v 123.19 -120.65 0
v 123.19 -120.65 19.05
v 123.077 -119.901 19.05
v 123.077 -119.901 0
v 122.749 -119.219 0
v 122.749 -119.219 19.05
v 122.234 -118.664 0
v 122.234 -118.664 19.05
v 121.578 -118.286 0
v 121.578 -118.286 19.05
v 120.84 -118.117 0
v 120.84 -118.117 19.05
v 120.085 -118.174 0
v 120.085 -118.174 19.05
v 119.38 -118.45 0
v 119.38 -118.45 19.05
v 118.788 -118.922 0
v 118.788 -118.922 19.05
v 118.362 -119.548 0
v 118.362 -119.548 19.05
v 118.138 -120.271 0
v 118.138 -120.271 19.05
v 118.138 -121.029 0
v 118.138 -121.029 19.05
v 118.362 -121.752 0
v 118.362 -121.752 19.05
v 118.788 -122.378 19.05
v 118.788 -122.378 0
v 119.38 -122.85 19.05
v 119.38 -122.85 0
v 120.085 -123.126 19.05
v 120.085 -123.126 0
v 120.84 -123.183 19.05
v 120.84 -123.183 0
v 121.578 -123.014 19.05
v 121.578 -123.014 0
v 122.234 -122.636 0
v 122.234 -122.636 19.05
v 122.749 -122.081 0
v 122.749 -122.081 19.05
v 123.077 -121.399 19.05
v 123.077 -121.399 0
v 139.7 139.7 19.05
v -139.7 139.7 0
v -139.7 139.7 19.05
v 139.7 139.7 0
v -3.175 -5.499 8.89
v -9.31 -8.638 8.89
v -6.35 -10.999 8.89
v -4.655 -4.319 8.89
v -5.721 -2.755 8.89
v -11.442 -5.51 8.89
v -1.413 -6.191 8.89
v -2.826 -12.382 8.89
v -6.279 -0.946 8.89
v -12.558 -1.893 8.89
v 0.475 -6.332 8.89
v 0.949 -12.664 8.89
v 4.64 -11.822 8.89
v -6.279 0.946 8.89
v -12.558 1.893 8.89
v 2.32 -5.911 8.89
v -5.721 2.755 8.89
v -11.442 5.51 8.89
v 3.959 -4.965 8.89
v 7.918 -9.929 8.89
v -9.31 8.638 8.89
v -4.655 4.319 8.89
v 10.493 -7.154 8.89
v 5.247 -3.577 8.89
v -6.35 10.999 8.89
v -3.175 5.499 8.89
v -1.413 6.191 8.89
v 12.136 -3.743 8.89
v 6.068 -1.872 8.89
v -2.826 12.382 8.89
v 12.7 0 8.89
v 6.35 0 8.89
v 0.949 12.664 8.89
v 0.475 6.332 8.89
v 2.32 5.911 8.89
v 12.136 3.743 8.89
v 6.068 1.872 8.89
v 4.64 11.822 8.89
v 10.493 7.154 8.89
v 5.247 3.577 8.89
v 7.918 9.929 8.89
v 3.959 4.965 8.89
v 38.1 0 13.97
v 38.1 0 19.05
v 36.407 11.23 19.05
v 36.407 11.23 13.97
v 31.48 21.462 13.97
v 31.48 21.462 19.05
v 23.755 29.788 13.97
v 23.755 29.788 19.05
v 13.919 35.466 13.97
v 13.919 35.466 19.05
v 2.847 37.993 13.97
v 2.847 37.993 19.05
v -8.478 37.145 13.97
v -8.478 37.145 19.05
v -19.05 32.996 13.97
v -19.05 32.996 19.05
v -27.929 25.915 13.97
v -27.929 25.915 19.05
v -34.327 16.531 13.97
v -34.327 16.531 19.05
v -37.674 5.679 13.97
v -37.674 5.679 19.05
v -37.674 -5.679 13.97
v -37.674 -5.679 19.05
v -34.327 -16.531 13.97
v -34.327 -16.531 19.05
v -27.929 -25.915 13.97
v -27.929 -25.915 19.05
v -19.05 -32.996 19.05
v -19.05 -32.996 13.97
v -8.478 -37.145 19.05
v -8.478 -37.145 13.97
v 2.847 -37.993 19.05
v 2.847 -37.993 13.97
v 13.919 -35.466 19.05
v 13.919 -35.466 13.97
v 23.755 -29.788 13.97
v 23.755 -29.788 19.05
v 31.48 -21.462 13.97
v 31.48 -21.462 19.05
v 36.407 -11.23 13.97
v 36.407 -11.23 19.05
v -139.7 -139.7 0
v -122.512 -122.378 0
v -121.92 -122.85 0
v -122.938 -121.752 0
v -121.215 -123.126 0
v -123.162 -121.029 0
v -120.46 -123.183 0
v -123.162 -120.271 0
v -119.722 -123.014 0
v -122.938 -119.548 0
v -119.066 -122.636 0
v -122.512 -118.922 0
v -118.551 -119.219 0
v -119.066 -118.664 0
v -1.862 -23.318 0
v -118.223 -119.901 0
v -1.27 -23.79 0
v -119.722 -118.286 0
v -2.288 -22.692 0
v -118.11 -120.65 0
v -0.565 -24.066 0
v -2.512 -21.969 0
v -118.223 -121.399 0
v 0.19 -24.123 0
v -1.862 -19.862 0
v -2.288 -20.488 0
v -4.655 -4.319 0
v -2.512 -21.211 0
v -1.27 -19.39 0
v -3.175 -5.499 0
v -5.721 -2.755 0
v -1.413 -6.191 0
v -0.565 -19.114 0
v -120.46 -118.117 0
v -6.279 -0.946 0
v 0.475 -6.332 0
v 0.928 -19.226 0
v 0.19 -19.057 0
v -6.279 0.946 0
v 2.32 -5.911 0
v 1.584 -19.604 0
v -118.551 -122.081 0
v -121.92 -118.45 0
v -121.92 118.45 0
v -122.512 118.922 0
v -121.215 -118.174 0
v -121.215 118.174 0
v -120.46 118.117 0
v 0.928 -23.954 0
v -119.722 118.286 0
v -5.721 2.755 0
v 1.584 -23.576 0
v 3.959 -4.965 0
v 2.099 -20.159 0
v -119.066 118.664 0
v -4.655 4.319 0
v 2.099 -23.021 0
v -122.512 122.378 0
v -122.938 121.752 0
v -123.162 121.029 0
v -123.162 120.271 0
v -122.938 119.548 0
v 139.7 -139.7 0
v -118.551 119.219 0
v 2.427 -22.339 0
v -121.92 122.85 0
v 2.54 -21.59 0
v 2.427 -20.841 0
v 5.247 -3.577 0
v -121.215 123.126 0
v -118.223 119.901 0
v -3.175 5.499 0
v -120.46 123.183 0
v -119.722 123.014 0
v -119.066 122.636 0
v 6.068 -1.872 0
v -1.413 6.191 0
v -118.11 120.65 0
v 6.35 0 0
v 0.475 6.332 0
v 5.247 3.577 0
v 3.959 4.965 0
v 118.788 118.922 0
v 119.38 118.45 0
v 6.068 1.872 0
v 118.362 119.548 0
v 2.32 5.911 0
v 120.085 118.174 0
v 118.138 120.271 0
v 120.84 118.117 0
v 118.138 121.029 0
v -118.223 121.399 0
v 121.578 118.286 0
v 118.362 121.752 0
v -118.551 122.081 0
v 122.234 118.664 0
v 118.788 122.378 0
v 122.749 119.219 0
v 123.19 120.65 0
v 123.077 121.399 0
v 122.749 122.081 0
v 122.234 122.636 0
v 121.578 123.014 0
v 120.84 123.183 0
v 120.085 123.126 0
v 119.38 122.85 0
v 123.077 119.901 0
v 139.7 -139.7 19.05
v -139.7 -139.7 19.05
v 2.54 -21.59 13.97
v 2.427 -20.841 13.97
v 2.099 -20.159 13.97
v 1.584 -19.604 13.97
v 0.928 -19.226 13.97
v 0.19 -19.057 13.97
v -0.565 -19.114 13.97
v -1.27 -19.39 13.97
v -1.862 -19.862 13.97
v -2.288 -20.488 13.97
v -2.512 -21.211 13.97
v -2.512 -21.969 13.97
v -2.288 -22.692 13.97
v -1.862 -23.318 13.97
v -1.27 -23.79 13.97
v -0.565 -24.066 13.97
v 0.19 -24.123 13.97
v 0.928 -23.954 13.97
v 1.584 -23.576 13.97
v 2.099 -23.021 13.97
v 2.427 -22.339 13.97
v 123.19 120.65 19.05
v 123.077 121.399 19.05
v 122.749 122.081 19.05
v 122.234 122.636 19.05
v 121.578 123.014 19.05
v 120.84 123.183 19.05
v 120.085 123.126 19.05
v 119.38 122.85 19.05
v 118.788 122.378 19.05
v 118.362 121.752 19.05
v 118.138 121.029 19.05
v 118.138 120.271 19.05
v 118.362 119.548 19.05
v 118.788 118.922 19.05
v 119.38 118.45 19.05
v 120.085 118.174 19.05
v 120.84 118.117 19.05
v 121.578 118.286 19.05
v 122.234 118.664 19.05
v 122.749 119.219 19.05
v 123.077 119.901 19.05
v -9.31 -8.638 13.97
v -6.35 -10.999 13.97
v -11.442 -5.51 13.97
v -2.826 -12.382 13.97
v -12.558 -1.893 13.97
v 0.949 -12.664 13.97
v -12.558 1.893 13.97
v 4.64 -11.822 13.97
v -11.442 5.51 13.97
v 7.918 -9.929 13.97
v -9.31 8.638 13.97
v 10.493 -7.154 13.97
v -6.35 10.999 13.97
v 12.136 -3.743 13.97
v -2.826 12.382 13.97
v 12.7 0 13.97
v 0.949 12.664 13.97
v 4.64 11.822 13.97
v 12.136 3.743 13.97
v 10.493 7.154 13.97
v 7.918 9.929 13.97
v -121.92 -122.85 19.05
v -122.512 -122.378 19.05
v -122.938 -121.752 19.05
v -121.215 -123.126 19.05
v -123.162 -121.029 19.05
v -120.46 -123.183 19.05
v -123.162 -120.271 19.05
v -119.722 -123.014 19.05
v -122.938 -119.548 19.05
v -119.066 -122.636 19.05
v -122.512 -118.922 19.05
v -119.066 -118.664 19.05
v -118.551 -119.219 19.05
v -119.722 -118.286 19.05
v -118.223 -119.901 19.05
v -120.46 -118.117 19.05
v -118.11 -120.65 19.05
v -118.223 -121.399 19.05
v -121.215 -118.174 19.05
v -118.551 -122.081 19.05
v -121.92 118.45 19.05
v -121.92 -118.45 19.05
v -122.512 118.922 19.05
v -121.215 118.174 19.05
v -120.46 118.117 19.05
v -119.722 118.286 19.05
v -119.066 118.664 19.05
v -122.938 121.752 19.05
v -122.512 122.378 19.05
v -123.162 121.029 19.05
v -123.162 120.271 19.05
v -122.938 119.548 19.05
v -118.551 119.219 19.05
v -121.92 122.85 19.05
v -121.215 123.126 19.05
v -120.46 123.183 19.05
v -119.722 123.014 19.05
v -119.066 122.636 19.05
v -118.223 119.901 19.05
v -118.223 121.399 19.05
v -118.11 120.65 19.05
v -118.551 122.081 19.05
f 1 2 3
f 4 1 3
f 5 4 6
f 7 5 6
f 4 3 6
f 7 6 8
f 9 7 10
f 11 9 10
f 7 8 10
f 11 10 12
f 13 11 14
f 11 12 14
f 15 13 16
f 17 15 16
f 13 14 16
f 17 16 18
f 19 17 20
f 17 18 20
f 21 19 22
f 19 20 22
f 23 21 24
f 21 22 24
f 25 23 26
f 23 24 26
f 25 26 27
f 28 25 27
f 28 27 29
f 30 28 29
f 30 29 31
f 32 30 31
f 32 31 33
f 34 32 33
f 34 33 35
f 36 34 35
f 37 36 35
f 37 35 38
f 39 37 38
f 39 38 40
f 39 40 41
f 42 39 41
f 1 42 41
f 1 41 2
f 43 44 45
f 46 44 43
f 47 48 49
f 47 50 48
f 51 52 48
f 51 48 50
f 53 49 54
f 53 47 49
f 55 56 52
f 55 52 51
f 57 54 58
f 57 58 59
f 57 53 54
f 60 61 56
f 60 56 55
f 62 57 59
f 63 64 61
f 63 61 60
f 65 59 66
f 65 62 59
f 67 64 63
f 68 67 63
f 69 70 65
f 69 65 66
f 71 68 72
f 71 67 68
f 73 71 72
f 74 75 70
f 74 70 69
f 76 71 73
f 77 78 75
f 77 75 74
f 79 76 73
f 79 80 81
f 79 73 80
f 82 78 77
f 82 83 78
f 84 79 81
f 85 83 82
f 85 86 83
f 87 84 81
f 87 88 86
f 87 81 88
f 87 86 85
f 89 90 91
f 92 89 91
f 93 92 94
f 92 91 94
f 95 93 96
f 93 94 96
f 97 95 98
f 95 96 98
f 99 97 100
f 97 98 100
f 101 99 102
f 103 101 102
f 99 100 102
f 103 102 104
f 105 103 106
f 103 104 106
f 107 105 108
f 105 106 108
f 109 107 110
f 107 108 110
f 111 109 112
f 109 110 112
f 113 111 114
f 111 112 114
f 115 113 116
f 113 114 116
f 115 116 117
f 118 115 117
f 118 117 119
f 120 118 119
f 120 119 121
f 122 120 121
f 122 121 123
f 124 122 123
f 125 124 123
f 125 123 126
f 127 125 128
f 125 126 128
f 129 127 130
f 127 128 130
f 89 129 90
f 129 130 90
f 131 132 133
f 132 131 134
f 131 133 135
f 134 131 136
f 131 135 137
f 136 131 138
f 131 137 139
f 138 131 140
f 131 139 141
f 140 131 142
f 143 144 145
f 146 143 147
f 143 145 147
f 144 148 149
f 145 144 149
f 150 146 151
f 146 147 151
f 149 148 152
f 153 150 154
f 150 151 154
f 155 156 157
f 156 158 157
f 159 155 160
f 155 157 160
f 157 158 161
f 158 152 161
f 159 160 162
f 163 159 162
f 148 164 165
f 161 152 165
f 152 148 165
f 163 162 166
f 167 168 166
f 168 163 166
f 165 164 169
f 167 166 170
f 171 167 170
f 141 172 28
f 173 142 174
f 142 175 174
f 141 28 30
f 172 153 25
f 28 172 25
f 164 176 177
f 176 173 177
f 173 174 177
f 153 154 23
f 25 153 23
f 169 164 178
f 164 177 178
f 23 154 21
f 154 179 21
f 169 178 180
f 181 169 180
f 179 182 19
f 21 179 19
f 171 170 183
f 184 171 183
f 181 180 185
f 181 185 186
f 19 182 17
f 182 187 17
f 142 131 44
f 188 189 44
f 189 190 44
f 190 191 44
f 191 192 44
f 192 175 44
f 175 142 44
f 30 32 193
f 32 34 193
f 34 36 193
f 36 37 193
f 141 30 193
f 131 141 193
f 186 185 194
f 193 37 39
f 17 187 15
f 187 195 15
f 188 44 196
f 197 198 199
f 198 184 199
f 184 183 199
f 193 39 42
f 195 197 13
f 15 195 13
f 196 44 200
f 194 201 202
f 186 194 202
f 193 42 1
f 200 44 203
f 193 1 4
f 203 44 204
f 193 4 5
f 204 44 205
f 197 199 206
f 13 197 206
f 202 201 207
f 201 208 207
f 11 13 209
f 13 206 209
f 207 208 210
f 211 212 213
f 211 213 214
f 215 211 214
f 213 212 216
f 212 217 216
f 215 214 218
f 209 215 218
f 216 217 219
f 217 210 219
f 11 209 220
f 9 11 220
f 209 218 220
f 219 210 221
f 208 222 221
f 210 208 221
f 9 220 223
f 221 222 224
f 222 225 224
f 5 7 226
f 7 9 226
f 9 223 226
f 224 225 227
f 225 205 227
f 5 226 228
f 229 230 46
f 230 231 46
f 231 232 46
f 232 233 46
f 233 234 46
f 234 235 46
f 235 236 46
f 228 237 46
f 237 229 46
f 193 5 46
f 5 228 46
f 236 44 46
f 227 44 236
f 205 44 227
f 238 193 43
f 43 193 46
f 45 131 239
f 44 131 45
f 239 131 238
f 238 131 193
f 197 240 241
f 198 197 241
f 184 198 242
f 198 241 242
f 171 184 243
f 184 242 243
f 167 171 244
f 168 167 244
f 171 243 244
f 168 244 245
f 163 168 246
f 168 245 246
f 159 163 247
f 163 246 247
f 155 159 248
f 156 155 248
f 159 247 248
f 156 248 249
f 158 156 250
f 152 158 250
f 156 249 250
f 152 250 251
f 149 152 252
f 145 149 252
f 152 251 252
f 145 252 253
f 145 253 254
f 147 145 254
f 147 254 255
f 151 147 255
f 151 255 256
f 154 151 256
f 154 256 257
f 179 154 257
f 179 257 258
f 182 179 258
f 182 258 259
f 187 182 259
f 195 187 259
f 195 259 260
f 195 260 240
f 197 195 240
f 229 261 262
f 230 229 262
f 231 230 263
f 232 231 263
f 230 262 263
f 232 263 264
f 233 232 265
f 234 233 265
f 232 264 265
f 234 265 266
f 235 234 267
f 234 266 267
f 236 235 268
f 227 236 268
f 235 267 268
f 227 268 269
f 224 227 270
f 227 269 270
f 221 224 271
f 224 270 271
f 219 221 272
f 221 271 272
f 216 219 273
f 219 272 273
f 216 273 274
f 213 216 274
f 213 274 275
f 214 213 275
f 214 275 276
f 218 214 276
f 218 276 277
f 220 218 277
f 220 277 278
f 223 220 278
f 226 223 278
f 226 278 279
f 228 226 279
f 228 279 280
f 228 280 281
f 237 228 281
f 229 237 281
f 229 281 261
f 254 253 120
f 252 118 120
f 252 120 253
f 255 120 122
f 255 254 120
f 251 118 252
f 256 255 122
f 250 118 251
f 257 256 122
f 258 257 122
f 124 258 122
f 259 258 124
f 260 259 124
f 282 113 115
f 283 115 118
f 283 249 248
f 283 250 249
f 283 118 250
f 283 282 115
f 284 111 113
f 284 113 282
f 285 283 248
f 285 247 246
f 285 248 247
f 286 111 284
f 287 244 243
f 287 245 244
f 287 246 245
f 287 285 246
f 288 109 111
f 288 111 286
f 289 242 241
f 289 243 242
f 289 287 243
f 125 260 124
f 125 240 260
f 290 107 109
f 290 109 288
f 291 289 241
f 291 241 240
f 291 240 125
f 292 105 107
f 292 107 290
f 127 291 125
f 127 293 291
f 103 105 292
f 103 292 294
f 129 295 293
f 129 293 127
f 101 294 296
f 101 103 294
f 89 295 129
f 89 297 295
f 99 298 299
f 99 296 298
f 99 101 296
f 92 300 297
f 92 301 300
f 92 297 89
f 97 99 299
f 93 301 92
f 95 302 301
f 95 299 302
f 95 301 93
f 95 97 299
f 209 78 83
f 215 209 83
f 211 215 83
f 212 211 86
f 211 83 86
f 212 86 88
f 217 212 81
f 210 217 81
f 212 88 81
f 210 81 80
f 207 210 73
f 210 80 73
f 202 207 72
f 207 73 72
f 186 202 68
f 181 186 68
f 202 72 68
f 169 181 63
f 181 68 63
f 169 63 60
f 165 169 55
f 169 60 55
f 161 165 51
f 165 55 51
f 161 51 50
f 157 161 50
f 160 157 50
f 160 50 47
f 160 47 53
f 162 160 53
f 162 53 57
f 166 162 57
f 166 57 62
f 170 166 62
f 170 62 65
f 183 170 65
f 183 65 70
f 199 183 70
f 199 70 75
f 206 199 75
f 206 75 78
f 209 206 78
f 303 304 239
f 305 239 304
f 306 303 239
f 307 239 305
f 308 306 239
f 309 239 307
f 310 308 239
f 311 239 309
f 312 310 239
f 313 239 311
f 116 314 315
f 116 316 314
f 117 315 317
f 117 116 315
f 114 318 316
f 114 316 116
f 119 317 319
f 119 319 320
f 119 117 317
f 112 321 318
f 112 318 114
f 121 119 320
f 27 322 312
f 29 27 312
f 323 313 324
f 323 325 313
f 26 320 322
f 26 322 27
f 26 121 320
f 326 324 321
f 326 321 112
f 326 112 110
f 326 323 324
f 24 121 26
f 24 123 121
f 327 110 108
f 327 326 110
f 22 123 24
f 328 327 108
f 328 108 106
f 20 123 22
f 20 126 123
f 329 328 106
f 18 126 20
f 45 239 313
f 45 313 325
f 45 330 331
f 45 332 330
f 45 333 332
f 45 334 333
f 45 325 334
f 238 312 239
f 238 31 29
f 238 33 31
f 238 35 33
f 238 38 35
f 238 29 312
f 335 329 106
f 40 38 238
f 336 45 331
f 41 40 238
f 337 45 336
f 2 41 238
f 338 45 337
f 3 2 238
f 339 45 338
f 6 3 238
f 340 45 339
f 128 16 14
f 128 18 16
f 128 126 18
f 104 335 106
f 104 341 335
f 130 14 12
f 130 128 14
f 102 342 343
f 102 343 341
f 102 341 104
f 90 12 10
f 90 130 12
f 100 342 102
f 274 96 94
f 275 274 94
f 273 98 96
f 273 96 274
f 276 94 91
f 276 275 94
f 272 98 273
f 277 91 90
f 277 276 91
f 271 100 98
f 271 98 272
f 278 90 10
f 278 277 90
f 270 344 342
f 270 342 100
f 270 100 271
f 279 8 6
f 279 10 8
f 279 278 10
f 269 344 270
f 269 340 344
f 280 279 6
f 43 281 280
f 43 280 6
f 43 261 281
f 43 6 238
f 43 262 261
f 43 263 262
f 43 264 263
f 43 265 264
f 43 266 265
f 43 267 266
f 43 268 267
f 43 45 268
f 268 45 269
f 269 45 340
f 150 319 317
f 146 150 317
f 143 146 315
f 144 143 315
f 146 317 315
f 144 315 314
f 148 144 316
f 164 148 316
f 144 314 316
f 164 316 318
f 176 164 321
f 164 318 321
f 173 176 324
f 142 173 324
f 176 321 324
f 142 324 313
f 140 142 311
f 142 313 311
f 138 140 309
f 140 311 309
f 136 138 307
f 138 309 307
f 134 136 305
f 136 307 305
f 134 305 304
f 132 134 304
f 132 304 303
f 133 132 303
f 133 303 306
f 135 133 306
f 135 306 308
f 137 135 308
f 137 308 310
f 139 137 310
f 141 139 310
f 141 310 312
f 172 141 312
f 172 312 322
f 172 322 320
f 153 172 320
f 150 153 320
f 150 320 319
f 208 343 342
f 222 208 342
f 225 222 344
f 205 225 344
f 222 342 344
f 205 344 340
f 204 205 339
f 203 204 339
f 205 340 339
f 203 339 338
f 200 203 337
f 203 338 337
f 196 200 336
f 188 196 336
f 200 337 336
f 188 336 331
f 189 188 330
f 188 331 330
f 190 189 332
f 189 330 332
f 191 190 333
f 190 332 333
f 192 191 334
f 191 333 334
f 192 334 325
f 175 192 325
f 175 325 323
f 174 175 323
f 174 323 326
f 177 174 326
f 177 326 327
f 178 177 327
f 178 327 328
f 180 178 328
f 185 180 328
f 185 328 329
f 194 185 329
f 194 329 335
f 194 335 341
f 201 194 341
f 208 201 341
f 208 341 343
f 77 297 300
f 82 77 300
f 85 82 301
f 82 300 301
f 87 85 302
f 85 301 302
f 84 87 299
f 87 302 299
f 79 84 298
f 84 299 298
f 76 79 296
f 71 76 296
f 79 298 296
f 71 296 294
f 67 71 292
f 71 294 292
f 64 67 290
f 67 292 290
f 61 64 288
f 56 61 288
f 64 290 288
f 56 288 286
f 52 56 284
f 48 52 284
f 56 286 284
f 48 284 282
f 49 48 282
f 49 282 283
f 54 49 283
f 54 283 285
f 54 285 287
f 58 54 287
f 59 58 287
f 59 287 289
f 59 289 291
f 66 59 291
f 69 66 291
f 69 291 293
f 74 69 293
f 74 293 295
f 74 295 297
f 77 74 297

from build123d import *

# Parameters (mm, degrees)
SKETCH2_W           = 279.4
SKETCH2_H           = 279.4
BOSS_EXTRUDE1_DEPTH = 19.05
SKETCH6_R           = 12.7
CUT_EXTRUDE3_DEPTH  = 10.16
SKETCH8_R           = 38.1
CUT_EXTRUDE4_DEPTH  = 5.08
SKETCH9_R           = 6.35
CUT_EXTRUDE5_DEPTH  = 39.37
SKETCH10_R          = 2.54
CUT_EXTRUDE6_DEPTH  = 39.37
SKETCH11_R          = 2.54
CUT_EXTRUDE7_DEPTH  = 36.576


with BuildPart() as part:
    # Sketch2 → Boss-Extrude1 (new body)
    with BuildSketch(Plane.XY):
        Rectangle(SKETCH2_W, SKETCH2_H)
    extrude(amount=BOSS_EXTRUDE1_DEPTH)

    # Sketch6 → Cut-Extrude3 (cut)
    with BuildSketch(Plane.XY.offset(19.05)):
        Circle(SKETCH6_R)
    extrude(amount=-CUT_EXTRUDE3_DEPTH, mode=Mode.SUBTRACT)

    # Sketch8 → Cut-Extrude4 (cut)
    with BuildSketch(Plane.XY.offset(19.05)):
        Circle(SKETCH8_R)
    extrude(amount=-CUT_EXTRUDE4_DEPTH, mode=Mode.SUBTRACT)

    # Sketch9 → Cut-Extrude5 (cut)
    with BuildSketch(Plane.XY.offset(8.89)):
        Circle(SKETCH9_R)
    extrude(amount=-CUT_EXTRUDE5_DEPTH, mode=Mode.SUBTRACT)

    # Sketch10 → Cut-Extrude6 (cut)
    with BuildSketch(Plane.XY.offset(19.05)):
        with Locations((-120.65, -120.65)):
            Circle(SKETCH10_R)
        with Locations((-120.65, 120.65)):
            Circle(SKETCH10_R)
        with Locations((120.65, 120.65)):
            Circle(SKETCH10_R)
        with Locations((120.65, -120.65)):
            Circle(SKETCH10_R)
    extrude(amount=-CUT_EXTRUDE6_DEPTH, mode=Mode.SUBTRACT)

    # Sketch11 → Cut-Extrude7 (cut)
    with BuildSketch(Plane.XY.offset(19.05)):
        with Locations((0, -21.59)):
            Circle(SKETCH11_R)
    extrude(amount=-CUT_EXTRUDE7_DEPTH, mode=Mode.SUBTRACT)


solid = part.part
